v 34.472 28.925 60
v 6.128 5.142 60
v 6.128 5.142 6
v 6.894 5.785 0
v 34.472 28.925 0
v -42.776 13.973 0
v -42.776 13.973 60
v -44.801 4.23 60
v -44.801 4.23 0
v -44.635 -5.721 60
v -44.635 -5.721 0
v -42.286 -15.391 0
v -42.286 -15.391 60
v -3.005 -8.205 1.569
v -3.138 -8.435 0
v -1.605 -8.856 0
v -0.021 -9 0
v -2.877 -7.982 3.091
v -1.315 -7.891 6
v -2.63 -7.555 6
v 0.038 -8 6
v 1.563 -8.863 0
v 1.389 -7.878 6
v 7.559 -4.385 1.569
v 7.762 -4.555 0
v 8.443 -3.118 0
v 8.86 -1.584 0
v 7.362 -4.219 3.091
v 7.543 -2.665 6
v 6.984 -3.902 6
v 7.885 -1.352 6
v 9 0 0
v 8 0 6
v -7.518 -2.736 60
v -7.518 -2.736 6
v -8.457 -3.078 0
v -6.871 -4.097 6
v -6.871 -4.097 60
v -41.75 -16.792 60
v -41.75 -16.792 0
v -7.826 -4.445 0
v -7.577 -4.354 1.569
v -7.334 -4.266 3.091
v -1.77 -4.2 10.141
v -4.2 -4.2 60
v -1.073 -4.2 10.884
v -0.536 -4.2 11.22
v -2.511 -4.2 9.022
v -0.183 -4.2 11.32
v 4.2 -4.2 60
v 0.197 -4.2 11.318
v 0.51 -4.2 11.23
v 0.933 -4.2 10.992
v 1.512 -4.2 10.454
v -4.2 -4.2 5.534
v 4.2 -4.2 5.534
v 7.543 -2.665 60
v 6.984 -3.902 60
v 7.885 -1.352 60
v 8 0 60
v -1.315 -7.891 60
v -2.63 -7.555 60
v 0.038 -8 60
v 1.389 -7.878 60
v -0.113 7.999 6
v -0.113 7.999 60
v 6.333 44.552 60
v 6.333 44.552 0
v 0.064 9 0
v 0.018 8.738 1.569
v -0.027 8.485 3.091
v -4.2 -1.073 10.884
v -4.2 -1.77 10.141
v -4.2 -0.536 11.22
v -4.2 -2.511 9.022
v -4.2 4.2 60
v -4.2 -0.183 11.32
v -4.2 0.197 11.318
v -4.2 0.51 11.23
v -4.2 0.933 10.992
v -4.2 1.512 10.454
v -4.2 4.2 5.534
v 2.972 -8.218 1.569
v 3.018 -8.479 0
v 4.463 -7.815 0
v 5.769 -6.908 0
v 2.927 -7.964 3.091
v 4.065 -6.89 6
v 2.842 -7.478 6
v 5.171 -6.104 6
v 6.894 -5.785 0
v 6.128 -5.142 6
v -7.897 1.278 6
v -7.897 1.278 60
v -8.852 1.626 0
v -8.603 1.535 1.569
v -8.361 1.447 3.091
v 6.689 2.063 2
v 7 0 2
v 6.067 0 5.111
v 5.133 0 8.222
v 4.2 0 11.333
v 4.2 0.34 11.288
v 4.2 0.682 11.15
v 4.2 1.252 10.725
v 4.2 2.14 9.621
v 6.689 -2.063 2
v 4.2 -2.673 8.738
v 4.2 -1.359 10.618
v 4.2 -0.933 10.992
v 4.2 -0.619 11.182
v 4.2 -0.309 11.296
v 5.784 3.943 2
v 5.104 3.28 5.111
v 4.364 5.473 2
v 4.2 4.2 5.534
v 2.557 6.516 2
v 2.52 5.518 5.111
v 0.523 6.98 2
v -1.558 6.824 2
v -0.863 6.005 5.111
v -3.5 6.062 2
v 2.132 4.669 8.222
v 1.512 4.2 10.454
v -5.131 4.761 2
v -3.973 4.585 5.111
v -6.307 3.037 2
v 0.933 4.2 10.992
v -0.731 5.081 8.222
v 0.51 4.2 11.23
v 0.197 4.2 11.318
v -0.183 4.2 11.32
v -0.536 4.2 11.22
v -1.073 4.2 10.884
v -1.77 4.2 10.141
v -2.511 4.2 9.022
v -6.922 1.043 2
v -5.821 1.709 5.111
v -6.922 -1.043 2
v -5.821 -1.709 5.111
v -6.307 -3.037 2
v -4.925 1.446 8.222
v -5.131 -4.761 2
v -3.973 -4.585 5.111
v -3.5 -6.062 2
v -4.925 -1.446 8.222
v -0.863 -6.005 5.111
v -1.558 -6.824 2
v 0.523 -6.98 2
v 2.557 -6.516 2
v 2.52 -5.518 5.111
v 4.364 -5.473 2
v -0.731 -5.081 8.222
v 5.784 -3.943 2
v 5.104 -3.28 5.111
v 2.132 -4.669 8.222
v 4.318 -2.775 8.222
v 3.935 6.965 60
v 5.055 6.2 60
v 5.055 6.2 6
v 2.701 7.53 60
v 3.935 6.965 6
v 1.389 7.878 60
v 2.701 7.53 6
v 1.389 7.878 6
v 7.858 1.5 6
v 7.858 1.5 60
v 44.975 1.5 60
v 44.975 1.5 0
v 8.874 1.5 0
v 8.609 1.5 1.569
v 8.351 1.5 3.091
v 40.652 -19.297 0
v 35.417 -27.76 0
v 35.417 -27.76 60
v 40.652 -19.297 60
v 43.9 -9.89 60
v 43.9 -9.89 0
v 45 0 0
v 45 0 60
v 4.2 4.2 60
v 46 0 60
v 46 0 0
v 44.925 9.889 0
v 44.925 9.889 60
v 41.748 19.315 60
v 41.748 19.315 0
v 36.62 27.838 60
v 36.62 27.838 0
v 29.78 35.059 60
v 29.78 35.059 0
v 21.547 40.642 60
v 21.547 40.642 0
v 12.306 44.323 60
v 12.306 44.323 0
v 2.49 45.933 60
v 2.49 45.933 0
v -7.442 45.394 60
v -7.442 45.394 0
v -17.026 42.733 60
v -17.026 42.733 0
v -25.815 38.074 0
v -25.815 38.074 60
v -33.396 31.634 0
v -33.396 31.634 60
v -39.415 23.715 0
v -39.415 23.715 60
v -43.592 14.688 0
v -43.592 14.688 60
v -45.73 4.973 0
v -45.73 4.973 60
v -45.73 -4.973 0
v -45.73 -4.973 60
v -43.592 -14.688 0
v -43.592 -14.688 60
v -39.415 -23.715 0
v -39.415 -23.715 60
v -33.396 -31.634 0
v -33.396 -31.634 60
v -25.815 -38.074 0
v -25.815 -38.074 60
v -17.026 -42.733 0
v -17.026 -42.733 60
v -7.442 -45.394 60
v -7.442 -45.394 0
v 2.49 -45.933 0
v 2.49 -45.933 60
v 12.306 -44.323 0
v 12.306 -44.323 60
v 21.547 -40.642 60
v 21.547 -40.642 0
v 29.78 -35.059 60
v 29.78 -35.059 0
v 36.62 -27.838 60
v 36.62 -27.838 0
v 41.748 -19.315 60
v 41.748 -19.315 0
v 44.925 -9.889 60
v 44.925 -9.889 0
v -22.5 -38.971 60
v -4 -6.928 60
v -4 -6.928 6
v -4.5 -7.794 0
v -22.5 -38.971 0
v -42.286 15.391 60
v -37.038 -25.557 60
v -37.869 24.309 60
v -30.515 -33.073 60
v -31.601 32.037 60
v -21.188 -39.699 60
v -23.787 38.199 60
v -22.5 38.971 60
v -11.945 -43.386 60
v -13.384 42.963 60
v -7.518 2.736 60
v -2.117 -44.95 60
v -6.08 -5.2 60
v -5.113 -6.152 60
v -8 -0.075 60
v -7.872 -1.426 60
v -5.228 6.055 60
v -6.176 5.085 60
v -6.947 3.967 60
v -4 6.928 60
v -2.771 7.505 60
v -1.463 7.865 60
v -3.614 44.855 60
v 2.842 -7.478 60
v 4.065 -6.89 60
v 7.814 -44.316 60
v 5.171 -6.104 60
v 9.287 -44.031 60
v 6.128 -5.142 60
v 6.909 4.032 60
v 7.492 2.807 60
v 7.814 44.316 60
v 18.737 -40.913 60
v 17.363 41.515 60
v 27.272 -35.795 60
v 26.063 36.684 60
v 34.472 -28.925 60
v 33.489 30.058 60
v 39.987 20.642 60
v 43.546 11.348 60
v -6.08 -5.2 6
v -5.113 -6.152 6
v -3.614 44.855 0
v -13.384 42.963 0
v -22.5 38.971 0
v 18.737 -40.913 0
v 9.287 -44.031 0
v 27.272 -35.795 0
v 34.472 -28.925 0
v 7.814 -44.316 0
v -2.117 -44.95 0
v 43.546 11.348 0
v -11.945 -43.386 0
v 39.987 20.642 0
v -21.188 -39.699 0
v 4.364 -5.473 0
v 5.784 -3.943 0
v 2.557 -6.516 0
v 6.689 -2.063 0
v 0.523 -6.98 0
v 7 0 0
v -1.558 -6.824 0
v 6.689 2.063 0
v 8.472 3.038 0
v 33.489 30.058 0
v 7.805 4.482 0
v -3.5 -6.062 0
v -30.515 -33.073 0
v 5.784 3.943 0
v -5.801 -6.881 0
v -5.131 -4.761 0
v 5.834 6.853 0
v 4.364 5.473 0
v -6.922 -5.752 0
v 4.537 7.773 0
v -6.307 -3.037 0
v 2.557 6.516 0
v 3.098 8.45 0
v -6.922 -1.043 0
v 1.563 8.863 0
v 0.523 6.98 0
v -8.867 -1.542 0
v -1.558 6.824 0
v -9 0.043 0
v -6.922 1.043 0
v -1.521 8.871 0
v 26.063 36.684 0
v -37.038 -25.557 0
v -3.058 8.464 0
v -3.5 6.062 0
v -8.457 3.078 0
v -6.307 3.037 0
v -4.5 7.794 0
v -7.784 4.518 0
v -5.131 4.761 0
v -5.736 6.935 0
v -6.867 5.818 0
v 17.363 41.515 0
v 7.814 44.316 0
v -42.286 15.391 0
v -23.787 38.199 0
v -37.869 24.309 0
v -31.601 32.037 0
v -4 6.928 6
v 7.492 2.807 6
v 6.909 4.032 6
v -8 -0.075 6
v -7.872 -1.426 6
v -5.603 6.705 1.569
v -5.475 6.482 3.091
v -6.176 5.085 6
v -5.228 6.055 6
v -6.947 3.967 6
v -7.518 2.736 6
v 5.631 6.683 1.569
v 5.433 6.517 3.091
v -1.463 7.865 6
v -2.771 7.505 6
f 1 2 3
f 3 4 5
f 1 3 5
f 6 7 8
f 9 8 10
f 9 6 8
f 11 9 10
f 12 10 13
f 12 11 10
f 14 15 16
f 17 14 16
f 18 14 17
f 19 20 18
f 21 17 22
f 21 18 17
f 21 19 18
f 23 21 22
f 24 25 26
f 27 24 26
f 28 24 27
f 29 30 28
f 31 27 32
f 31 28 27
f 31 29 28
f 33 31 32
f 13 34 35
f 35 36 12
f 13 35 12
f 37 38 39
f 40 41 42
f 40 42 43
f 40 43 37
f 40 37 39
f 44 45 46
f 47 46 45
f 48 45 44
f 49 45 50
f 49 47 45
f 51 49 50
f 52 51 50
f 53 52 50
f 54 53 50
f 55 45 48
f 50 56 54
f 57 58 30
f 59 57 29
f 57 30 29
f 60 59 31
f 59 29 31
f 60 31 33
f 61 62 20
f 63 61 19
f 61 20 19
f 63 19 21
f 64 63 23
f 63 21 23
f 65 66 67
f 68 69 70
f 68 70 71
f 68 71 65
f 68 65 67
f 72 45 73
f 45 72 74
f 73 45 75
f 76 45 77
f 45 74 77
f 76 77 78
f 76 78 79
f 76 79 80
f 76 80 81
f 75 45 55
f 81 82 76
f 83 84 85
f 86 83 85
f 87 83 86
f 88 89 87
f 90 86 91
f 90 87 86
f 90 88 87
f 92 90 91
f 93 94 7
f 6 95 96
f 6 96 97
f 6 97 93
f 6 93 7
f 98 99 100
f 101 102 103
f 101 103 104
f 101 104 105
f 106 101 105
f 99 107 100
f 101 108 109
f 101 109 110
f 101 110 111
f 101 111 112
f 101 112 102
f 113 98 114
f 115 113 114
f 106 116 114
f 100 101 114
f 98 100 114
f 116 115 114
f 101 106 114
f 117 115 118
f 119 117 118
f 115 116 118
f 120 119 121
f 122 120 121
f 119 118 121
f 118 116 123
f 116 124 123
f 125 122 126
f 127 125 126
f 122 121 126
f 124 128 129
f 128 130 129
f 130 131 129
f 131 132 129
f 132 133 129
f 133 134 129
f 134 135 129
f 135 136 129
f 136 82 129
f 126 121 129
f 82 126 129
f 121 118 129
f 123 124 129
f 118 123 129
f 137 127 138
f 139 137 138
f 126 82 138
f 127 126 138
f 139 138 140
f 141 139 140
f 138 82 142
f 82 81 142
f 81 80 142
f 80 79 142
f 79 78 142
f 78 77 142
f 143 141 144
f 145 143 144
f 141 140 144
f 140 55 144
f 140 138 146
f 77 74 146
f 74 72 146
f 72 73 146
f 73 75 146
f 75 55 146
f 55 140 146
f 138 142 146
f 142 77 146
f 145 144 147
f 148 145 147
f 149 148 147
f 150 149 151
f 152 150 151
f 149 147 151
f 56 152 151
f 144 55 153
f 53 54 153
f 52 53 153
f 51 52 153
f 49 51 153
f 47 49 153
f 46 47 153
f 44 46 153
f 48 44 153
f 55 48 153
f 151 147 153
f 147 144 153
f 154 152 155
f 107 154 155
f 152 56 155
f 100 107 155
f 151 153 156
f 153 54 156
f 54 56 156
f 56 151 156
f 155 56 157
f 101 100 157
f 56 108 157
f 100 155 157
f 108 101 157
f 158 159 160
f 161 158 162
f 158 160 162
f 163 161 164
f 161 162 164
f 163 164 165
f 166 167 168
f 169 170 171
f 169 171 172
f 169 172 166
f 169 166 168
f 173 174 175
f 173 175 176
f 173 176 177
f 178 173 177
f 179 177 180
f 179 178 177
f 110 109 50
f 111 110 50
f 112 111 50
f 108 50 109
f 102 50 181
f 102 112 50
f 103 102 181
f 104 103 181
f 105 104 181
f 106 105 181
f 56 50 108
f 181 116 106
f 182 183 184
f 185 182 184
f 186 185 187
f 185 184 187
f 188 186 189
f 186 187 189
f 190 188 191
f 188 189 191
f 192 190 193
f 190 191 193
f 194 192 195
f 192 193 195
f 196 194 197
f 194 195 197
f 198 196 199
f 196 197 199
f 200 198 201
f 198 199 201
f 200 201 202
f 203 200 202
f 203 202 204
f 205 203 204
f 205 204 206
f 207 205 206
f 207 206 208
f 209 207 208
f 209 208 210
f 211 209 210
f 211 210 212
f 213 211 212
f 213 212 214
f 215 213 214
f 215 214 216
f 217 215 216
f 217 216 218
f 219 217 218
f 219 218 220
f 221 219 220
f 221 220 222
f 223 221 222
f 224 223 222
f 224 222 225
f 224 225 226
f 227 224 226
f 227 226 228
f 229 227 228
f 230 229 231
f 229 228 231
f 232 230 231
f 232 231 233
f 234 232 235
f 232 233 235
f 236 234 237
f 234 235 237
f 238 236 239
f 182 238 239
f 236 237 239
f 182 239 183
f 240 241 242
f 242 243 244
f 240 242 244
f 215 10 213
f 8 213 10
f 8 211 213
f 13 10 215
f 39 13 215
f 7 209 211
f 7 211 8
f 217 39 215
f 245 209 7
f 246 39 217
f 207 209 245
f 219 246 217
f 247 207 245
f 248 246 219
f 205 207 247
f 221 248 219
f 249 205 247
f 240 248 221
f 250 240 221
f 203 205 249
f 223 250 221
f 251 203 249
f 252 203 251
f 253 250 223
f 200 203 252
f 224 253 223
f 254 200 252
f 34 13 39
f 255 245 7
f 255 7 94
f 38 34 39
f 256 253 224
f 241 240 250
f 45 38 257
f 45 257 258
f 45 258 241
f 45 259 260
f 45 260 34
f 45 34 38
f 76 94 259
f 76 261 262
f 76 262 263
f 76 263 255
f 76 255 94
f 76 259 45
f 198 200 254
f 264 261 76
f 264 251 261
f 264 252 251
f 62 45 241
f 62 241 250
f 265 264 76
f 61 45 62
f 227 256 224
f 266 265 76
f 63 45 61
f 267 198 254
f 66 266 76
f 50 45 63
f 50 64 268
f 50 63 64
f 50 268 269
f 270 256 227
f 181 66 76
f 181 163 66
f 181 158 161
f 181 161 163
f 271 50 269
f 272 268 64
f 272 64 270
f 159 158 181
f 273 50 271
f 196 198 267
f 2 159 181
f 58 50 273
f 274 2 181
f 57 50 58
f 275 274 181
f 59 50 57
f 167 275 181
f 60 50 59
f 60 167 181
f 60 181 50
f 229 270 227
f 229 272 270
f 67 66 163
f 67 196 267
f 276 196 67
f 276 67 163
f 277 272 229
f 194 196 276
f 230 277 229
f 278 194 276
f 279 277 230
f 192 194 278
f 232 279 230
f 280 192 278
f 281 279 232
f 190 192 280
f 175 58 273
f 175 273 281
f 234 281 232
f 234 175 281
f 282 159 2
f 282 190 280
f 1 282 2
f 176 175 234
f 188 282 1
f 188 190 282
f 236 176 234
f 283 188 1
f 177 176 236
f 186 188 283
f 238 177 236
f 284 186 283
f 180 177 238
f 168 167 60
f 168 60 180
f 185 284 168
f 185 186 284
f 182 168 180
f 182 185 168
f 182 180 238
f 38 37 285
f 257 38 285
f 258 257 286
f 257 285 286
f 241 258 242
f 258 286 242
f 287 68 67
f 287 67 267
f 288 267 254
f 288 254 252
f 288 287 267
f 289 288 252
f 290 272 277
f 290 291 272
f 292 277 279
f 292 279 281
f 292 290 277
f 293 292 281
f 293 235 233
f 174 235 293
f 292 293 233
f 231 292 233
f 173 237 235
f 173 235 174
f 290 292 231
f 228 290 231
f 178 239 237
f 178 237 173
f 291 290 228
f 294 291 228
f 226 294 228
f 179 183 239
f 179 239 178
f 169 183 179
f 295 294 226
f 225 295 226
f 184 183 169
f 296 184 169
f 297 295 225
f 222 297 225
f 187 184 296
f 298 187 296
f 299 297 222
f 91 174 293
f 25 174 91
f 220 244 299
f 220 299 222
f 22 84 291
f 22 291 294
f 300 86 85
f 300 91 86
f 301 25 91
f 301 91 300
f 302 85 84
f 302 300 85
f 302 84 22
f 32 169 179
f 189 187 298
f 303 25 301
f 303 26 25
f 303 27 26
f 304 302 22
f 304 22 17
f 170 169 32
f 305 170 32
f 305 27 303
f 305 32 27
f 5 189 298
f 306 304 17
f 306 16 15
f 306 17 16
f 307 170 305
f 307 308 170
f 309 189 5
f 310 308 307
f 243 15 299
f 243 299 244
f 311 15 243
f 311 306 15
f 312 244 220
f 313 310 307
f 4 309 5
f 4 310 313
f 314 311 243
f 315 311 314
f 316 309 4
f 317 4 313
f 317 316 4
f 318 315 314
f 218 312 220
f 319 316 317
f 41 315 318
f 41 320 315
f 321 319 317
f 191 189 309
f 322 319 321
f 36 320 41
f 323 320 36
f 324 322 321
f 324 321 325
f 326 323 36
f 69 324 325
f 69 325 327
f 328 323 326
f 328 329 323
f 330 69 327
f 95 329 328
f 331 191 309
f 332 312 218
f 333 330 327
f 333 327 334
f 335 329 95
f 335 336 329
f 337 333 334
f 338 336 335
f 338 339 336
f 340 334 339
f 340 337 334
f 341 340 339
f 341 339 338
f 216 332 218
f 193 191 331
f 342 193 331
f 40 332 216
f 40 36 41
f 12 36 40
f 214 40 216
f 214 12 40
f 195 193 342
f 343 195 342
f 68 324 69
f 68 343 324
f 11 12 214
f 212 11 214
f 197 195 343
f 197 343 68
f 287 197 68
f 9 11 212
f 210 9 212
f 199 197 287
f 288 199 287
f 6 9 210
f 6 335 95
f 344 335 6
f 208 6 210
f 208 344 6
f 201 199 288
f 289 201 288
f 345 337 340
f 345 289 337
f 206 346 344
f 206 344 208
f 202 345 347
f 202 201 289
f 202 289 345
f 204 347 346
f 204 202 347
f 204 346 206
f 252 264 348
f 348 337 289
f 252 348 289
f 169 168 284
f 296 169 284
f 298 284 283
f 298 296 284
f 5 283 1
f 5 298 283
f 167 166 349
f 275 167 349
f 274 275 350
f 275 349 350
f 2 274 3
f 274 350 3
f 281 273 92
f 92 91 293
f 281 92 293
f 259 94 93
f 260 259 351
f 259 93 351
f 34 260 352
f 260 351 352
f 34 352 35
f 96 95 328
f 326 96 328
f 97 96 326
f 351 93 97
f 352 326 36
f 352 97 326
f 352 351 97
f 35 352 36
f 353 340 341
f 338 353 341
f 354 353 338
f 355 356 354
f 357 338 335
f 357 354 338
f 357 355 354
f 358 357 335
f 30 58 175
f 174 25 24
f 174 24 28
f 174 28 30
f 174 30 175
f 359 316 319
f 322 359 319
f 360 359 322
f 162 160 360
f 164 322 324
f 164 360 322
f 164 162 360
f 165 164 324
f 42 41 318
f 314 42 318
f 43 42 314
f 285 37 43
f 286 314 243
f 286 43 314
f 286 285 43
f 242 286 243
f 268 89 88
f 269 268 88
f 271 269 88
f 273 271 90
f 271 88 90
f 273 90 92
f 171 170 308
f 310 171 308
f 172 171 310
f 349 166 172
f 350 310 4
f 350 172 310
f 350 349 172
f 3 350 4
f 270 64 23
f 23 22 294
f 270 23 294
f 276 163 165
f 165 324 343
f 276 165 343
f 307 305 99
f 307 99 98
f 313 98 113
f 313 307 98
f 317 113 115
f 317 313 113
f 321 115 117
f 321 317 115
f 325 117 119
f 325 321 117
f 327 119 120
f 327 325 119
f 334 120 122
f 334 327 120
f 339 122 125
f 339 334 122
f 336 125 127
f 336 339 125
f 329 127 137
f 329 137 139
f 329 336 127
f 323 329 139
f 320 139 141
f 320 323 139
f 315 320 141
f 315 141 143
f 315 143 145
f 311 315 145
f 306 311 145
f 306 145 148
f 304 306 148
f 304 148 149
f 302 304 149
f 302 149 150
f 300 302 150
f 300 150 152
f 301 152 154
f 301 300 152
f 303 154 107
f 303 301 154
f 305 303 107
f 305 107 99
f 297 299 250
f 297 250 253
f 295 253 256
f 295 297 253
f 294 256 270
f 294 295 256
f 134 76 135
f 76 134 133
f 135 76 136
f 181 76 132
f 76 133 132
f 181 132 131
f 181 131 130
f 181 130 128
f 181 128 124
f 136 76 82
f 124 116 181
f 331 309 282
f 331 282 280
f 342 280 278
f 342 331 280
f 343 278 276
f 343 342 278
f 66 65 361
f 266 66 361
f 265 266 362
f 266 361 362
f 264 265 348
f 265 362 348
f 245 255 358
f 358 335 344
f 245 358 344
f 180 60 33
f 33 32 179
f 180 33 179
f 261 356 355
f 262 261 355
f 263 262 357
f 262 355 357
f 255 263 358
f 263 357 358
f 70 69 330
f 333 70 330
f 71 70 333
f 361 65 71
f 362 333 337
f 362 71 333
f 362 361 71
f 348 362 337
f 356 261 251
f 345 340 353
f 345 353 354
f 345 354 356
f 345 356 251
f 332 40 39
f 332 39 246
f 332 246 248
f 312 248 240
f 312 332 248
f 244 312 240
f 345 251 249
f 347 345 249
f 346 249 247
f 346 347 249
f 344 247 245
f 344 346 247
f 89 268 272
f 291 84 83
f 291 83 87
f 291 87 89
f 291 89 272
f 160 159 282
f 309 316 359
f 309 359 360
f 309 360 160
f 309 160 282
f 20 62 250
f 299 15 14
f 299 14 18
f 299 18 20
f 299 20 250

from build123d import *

# Parameters (mm, degrees)
CYLINDER021_R          = 7
CYLINDER021_DEPTH      = 2
TUBE017_R              = 60
TUBE017_R_2            = 46
TUBE017_DEPTH          = 60
BOX028_W               = 8.4
BOX028_H               = 8.4
BOX028_DEPTH           = 60
CYLINDER020_R          = 8
CYLINDER020_DEPTH      = 60
TUBE016_R              = 46
TUBE016_R_2            = 45
TUBE016_DEPTH          = 60
BOX029_W               = 50
BOX029_H               = 1.5
BOX029_DEPTH           = 60
BOX029_PLACEMENT_ANGLE = 40
BOX030_W               = 50
BOX030_H               = 1.5
BOX030_DEPTH           = 60
BOX030_PLACEMENT_ANGLE = 80
BOX031_W               = 50
BOX031_H               = 1.5
BOX031_DEPTH           = 60
BOX031_PLACEMENT_ANGLE = 120
BOX032_W               = 50
BOX032_H               = 1.5
BOX032_DEPTH           = 60
BOX032_PLACEMENT_ANGLE = 160
BOX033_W               = 50
BOX033_H               = 1.5
BOX033_DEPTH           = 60
BOX033_PLACEMENT_ANGLE = 200
BOX034_W               = 50
BOX034_H               = 1.5
BOX034_DEPTH           = 60
BOX034_PLACEMENT_ANGLE = 40
BOX035_W               = 50
BOX035_H               = 1.5
BOX035_DEPTH           = 60
BOX035_PLACEMENT_ANGLE = 280
BOX036_W               = 50
BOX036_H               = 1.5
BOX036_DEPTH           = 60
BOX036_PLACEMENT_ANGLE = 240
BOX037_W               = 50
BOX037_H               = 1.5
BOX037_DEPTH           = 60
BOX037_PLACEMENT_ANGLE = 200
BOX026_W               = 50
BOX026_H               = 1.5
BOX026_DEPTH           = 60


with BuildPart() as cone005:
    # Cone005 → Cone005 (revolve)
    with BuildSketch(Plane(origin=(0, 0, 2), x_dir=(1, 0, 0), z_dir=(0, -1, 0))):
        Polygon((0, 0), (7, 0), (4, 10), (0, 10), align=None)
    revolve(axis=Axis((0, 0, 2), (0, 0, 1)))


with BuildPart() as cylinder021:
    # Cylinder021 → Cylinder021 (new body)
    with BuildSketch(Plane.XY):
        Circle(CYLINDER021_R)
    extrude(amount=CYLINDER021_DEPTH)


with BuildPart() as tube017:
    # Tube017 → Tube017 (new body)
    with BuildSketch(Plane.XY):
        Circle(TUBE017_R)
        Circle(TUBE017_R_2, mode=Mode.SUBTRACT)
    extrude(amount=TUBE017_DEPTH)


with BuildPart() as fusion009008:
    # Box028 → Box028 (new body)
    with BuildSketch(Plane(origin=(-4.2, -4.2, 0), x_dir=(1, 0, 0), z_dir=(0, 0, 1))):
        with Locations((4.2, 4.2)):
            Rectangle(BOX028_W, BOX028_H)
    extrude(amount=BOX028_DEPTH)

    # Fusion009008: union Cone005, Cylinder021, Tube017
    add(cone005.part)
    add(cylinder021.part)
    add(tube017.part)


with BuildPart() as cylinder020:
    # Cylinder020 → Cylinder020 (new body)
    with BuildSketch(Plane.XY):
        Circle(CYLINDER020_R)
    extrude(amount=CYLINDER020_DEPTH)


with BuildPart() as tube016:
    # Tube016 → Tube016 (new body)
    with BuildSketch(Plane.XY):
        Circle(TUBE016_R)
        Circle(TUBE016_R_2, mode=Mode.SUBTRACT)
    extrude(amount=TUBE016_DEPTH)


with BuildPart() as cone006:
    # Cone006 → Cone006 (revolve)
    with BuildSketch(Plane.XZ):
        Polygon((0, 0), (9, 0), (4, 30), (0, 30), align=None)
    revolve(axis=Axis((0, 0, 0), (0, 0, 1)))


with BuildPart() as cube029:
    # Box029 → Box029 (new body)
    with BuildSketch(Plane.XY):
        with Locations((25, 0.75)):
            Rectangle(BOX029_W, BOX029_H)
    extrude(amount=BOX029_DEPTH)


with BuildPart() as cube029_1:
    # Box029 placement: moved
    add(cube029.part.rotate(Axis((0, 0, 0), (0, 0, 1)), BOX029_PLACEMENT_ANGLE))


with BuildPart() as cube030:
    # Box030 → Box030 (new body)
    with BuildSketch(Plane.XY):
        with Locations((25, 0.75)):
            Rectangle(BOX030_W, BOX030_H)
    extrude(amount=BOX030_DEPTH)


with BuildPart() as cube030_1:
    # Box030 placement: moved
    add(cube030.part.rotate(Axis((0, 0, 0), (0, 0, 1)), BOX030_PLACEMENT_ANGLE))


with BuildPart() as cube031:
    # Box031 → Box031 (new body)
    with BuildSketch(Plane.XY):
        with Locations((25, 0.75)):
            Rectangle(BOX031_W, BOX031_H)
    extrude(amount=BOX031_DEPTH)


with BuildPart() as cube031_1:
    # Box031 placement: moved
    add(cube031.part.rotate(Axis((0, 0, 0), (0, 0, 1)), BOX031_PLACEMENT_ANGLE))


with BuildPart() as cube032:
    # Box032 → Box032 (new body)
    with BuildSketch(Plane.XY):
        with Locations((25, 0.75)):
            Rectangle(BOX032_W, BOX032_H)
    extrude(amount=BOX032_DEPTH)


with BuildPart() as cube032_1:
    # Box032 placement: moved
    add(cube032.part.rotate(Axis((0, 0, 0), (0, 0, 1)), BOX032_PLACEMENT_ANGLE))


with BuildPart() as cube033:
    # Box033 → Box033 (new body)
    with BuildSketch(Plane.XY):
        with Locations((25, 0.75)):
            Rectangle(BOX033_W, BOX033_H)
    extrude(amount=BOX033_DEPTH)


with BuildPart() as cube033_1:
    # Box033 placement: moved
    add(cube033.part.rotate(Axis((0, 0, 0), (0, 0, 1)), BOX033_PLACEMENT_ANGLE))


with BuildPart() as cube034:
    # Box034 → Box034 (new body)
    with BuildSketch(Plane.XY):
        with Locations((25, 0.75)):
            Rectangle(BOX034_W, BOX034_H)
    extrude(amount=BOX034_DEPTH)


with BuildPart() as cube034_1:
    # Box034 placement: moved
    add(cube034.part.rotate(Axis((0, 0, 0), (0, 0, -1)), BOX034_PLACEMENT_ANGLE))


with BuildPart() as cube035:
    # Box035 → Box035 (new body)
    with BuildSketch(Plane.XY):
        with Locations((25, 0.75)):
            Rectangle(BOX035_W, BOX035_H)
    extrude(amount=BOX035_DEPTH)


with BuildPart() as cube035_1:
    # Box035 placement: moved
    add(cube035.part.rotate(Axis((0, 0, 0), (0, 0, 1)), BOX035_PLACEMENT_ANGLE))


with BuildPart() as cube036:
    # Box036 → Box036 (new body)
    with BuildSketch(Plane.XY):
        with Locations((25, 0.75)):
            Rectangle(BOX036_W, BOX036_H)
    extrude(amount=BOX036_DEPTH)


with BuildPart() as cube036_1:
    # Box036 placement: moved
    add(cube036.part.rotate(Axis((0, 0, 0), (0, 0, 1)), BOX036_PLACEMENT_ANGLE))


with BuildPart() as cube037:
    # Box037 → Box037 (new body)
    with BuildSketch(Plane.XY):
        with Locations((25, 0.75)):
            Rectangle(BOX037_W, BOX037_H)
    extrude(amount=BOX037_DEPTH)


with BuildPart() as cube037_1:
    # Box037 placement: moved
    add(cube037.part.rotate(Axis((0, 0, 0), (0, 0, 1)), BOX037_PLACEMENT_ANGLE))


with BuildPart() as cut_vnutro001:
    # Box026 → Box026 (new body)
    with BuildSketch(Plane.XY):
        with Locations((25, 0.75)):
            Rectangle(BOX026_W, BOX026_H)
    extrude(amount=BOX026_DEPTH)

    # Fusion009009: union Cylinder020, Tube016, Cone006, Cube029, Cube030, Cube031, Cube032, Cube033, Cube034, Cube035, Cube036, Cube037
    add(cylinder020.part)
    add(tube016.part)
    add(cone006.part)
    add(cube029_1.part)
    add(cube030_1.part)
    add(cube031_1.part)
    add(cube032_1.part)
    add(cube033_1.part)
    add(cube034_1.part)
    add(cube035_1.part)
    add(cube036_1.part)
    add(cube037_1.part)

    # Cut009008: cut Fusion009008
    add(fusion009008.part, mode=Mode.SUBTRACT)


solid = cut_vnutro001.part
